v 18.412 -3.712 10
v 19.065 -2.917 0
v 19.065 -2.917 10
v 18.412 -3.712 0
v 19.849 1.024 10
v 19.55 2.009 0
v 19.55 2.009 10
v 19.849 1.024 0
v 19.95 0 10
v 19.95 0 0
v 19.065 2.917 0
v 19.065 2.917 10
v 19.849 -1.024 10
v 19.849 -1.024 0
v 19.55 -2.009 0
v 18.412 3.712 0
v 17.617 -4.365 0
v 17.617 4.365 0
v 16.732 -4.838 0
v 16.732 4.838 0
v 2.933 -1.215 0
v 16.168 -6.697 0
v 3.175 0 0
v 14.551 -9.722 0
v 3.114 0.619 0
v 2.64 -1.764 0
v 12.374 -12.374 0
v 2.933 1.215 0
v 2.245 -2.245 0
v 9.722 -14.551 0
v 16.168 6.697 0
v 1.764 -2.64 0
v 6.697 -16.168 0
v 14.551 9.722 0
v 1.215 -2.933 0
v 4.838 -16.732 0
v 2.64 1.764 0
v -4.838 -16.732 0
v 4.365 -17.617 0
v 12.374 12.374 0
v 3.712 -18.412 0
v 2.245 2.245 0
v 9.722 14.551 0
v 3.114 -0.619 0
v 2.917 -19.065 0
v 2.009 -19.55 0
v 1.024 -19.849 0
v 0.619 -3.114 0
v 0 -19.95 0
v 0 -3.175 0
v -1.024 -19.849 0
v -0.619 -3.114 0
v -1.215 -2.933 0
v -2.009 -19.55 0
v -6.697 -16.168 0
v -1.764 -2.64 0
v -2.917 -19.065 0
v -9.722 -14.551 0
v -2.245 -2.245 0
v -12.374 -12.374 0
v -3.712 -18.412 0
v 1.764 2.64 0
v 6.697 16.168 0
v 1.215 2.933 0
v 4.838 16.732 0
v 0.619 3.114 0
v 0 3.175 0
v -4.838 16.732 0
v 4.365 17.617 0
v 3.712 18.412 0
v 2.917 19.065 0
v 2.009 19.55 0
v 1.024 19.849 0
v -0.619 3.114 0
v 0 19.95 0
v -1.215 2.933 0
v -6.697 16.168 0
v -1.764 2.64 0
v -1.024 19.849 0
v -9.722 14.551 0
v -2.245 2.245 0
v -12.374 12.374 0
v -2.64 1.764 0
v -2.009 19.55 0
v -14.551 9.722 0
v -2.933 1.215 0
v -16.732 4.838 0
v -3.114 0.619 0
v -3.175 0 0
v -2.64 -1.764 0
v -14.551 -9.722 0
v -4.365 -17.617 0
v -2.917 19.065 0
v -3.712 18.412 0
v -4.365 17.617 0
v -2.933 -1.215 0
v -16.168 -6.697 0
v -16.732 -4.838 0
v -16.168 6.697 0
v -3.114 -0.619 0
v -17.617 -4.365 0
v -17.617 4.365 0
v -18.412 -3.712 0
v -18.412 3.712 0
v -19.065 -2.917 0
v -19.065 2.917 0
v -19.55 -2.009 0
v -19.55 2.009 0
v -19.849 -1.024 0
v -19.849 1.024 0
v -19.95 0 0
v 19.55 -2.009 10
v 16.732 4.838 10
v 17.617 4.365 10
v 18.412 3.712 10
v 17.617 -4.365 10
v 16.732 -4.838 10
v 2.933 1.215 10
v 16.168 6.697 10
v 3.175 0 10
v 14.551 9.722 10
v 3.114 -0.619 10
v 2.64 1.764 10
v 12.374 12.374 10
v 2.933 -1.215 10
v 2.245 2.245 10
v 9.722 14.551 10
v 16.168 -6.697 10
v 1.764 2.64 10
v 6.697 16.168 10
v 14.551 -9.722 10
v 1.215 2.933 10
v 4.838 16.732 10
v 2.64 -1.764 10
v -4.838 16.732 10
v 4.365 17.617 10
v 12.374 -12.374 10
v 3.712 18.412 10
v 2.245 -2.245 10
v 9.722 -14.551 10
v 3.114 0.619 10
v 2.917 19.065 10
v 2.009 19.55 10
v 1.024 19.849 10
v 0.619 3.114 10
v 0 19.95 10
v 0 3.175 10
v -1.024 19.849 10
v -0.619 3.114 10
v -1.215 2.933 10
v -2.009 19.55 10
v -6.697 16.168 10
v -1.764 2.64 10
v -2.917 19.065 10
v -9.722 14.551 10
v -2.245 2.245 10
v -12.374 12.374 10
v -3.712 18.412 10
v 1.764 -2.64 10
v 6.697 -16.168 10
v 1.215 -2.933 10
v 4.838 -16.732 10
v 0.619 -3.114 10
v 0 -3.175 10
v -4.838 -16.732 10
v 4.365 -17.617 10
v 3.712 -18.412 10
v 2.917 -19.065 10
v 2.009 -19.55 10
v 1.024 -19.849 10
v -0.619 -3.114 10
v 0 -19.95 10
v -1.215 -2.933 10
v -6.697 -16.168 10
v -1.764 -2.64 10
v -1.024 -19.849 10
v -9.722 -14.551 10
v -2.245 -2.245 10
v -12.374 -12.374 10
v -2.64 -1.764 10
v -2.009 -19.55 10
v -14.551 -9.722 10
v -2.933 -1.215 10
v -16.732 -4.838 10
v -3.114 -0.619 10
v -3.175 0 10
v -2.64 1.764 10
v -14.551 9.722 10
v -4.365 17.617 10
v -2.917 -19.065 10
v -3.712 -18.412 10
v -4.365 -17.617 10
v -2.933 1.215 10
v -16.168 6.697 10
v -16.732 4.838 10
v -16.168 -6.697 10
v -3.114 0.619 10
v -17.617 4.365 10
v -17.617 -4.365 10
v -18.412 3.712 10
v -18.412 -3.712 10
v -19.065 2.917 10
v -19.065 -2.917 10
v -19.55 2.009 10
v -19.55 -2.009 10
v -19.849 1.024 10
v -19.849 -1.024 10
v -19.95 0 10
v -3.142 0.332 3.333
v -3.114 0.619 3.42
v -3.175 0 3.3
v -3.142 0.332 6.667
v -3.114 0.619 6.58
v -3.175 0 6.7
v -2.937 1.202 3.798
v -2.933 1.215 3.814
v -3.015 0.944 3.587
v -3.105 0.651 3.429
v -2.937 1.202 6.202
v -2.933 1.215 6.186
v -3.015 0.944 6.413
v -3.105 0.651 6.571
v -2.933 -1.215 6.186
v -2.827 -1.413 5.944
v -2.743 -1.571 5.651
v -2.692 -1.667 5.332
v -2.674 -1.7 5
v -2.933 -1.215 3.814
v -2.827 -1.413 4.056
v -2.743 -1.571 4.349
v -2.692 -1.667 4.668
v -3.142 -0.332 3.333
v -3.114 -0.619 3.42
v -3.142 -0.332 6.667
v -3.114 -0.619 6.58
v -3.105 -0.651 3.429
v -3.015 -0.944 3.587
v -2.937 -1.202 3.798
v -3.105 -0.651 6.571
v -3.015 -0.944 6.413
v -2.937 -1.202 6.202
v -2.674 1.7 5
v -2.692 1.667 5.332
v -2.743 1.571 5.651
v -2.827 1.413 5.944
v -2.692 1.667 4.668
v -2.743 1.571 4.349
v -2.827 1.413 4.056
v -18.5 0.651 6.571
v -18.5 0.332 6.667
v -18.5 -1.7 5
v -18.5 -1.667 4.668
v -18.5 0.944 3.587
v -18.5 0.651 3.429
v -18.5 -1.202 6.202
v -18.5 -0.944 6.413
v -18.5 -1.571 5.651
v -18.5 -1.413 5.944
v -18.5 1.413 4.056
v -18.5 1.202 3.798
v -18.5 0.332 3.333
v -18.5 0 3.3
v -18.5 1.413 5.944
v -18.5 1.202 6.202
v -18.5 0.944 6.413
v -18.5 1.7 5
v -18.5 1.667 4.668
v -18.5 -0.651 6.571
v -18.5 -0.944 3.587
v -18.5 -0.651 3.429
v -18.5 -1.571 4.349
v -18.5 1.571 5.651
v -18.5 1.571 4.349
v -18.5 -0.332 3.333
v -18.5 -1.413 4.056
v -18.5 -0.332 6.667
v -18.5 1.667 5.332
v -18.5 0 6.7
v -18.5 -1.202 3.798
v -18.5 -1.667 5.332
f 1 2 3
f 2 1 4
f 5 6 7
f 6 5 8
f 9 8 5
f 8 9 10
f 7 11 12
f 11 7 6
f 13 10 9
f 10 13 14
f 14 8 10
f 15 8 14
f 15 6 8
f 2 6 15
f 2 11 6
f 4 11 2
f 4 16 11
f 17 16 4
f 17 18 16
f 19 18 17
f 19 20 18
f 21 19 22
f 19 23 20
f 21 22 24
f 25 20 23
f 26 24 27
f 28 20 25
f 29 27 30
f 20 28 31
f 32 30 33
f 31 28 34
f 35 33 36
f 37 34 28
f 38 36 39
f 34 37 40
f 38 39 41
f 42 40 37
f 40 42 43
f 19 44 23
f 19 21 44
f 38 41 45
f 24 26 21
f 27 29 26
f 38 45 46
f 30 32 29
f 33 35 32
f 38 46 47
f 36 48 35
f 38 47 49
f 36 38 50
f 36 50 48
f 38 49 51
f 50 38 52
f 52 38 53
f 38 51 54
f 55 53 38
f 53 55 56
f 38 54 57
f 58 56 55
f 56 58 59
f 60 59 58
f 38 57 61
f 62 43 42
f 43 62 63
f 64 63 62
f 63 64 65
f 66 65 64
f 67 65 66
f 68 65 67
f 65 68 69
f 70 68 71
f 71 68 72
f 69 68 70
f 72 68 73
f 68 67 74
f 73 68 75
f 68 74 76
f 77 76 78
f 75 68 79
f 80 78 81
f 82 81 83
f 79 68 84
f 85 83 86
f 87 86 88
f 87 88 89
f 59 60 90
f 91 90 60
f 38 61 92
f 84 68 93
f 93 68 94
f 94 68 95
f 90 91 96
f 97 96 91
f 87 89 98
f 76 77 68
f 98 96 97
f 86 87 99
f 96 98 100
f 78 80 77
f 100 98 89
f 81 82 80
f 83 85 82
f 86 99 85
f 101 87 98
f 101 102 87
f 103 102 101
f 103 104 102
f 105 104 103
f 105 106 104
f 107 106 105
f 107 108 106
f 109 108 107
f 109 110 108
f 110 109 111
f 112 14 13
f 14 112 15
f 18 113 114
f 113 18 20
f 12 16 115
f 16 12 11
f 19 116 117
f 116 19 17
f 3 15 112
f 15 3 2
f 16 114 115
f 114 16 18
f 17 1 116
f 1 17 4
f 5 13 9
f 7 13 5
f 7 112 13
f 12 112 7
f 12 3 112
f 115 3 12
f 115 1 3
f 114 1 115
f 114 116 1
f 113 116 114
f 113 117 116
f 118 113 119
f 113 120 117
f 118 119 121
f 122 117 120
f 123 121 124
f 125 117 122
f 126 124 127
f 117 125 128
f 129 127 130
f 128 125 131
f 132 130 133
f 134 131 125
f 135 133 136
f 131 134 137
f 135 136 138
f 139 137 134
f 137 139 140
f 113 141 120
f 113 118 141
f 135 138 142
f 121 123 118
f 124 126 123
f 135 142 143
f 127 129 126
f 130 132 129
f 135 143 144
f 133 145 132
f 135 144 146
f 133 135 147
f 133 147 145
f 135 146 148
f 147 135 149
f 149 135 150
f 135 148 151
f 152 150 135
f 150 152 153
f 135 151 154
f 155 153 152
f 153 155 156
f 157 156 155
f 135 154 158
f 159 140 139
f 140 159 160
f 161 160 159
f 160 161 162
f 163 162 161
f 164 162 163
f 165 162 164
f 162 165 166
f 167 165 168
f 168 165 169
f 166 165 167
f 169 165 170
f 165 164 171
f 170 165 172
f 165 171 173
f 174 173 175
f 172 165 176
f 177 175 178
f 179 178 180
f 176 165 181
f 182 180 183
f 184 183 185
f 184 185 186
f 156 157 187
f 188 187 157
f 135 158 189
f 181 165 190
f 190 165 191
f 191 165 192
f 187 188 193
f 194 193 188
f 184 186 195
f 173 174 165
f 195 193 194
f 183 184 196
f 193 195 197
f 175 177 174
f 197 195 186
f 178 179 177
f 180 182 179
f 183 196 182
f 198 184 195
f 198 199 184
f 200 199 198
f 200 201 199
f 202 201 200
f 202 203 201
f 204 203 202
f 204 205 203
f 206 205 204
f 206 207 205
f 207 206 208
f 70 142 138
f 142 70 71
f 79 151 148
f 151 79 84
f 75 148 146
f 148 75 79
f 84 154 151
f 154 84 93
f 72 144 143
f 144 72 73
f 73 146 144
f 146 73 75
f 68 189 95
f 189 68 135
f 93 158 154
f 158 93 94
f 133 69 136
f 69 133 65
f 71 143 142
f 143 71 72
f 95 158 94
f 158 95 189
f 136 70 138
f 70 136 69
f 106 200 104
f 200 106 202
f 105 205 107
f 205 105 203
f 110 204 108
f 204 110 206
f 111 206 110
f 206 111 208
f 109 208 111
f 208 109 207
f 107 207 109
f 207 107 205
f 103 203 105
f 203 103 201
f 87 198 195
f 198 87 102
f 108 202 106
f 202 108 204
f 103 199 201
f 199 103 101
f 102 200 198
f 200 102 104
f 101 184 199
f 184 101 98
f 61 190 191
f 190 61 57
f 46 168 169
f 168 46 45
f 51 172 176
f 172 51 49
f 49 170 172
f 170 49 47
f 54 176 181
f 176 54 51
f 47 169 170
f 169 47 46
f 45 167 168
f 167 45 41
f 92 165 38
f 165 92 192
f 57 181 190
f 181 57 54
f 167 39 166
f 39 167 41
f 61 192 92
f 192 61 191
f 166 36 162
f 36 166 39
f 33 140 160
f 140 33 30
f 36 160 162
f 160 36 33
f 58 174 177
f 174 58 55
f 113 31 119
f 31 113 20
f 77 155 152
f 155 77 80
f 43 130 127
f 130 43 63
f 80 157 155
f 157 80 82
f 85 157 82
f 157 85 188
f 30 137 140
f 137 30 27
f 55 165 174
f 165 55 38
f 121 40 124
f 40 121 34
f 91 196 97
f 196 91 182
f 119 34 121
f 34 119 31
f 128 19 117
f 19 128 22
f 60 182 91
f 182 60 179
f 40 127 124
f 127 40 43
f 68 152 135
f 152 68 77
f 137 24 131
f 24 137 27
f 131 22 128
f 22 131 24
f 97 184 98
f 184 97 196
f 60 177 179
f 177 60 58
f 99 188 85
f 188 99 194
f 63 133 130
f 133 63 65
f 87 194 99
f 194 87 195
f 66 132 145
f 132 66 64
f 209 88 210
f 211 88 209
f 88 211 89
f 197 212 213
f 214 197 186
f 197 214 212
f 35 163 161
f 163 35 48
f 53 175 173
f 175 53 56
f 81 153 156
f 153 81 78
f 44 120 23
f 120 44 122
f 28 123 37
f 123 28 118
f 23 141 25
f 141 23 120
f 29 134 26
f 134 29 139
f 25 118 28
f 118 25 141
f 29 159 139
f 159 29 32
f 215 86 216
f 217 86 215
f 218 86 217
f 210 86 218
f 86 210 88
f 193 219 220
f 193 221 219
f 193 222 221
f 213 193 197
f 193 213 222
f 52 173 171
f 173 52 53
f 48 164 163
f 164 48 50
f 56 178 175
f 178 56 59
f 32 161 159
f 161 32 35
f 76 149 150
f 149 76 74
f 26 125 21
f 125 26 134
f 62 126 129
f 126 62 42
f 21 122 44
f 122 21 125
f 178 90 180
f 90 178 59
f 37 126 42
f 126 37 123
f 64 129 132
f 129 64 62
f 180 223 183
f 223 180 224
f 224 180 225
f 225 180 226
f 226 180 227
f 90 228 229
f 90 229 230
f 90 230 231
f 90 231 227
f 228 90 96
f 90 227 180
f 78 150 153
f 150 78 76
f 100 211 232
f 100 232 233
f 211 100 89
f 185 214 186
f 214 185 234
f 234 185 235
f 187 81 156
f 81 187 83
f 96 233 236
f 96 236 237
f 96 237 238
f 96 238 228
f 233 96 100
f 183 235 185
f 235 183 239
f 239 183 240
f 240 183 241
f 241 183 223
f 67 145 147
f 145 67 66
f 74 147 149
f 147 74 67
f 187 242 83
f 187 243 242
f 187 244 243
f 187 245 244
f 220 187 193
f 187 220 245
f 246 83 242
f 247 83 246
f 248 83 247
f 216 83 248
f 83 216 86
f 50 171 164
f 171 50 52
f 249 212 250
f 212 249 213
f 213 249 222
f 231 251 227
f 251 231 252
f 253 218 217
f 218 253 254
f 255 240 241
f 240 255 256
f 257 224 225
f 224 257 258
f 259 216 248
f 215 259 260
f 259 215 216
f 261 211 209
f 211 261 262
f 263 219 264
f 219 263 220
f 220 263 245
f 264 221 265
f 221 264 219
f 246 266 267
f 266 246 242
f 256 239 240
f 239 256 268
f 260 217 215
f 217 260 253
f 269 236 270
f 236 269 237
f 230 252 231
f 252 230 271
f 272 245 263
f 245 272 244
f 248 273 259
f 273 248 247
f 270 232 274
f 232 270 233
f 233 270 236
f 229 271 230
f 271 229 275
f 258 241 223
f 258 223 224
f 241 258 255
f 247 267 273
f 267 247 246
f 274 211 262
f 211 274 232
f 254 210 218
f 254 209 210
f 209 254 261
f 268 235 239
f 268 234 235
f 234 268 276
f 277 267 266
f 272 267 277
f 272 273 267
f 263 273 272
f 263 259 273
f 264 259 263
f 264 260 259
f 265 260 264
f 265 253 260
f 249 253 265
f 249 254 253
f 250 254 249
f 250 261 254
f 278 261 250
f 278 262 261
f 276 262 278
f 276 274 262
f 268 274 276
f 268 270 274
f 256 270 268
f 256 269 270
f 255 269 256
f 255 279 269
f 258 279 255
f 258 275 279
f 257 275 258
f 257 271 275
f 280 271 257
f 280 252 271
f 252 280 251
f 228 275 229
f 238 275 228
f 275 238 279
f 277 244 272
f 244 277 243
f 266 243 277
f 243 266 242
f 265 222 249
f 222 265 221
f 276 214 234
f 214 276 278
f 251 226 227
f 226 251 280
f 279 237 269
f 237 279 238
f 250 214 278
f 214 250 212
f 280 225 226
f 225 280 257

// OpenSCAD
$fn = 32;

// ----------------------------------------------------------------------
// Hand knob: 35 x 35 x 10 mm
// ----------------------------------------------------------------------

// --- parameters (mm) ---
grip_d = 35;              // knob diameter
grip_h = 10;              // knob height
shaft_d = 6.35;           // shaft bore
set_d = 3.4;              // set screw tap hole
knurl_dia = 0.77;         // knurl groove diameter
lobes = 4;                // grip lobes

module body() {
  cylinder(h = grip_h, d = grip_d);
  for (i = [0 : lobes - 1])
    rotate([0, 0, i * 360 / lobes])
      translate([grip_d * 0.42, 0, 0])
        cylinder(h = grip_h, d = grip_d * 0.3);
}

difference() {
  union() {
    body();
  }
  translate([0, 0, -1]) cylinder(h = grip_h + 0 + 2, d = shaft_d);
  translate([-grip_d / 2 - 1, 0, grip_h * 0.5]) rotate([0, 90, 0]) cylinder(h = grip_d / 2 + 2, d = set_d);
}
